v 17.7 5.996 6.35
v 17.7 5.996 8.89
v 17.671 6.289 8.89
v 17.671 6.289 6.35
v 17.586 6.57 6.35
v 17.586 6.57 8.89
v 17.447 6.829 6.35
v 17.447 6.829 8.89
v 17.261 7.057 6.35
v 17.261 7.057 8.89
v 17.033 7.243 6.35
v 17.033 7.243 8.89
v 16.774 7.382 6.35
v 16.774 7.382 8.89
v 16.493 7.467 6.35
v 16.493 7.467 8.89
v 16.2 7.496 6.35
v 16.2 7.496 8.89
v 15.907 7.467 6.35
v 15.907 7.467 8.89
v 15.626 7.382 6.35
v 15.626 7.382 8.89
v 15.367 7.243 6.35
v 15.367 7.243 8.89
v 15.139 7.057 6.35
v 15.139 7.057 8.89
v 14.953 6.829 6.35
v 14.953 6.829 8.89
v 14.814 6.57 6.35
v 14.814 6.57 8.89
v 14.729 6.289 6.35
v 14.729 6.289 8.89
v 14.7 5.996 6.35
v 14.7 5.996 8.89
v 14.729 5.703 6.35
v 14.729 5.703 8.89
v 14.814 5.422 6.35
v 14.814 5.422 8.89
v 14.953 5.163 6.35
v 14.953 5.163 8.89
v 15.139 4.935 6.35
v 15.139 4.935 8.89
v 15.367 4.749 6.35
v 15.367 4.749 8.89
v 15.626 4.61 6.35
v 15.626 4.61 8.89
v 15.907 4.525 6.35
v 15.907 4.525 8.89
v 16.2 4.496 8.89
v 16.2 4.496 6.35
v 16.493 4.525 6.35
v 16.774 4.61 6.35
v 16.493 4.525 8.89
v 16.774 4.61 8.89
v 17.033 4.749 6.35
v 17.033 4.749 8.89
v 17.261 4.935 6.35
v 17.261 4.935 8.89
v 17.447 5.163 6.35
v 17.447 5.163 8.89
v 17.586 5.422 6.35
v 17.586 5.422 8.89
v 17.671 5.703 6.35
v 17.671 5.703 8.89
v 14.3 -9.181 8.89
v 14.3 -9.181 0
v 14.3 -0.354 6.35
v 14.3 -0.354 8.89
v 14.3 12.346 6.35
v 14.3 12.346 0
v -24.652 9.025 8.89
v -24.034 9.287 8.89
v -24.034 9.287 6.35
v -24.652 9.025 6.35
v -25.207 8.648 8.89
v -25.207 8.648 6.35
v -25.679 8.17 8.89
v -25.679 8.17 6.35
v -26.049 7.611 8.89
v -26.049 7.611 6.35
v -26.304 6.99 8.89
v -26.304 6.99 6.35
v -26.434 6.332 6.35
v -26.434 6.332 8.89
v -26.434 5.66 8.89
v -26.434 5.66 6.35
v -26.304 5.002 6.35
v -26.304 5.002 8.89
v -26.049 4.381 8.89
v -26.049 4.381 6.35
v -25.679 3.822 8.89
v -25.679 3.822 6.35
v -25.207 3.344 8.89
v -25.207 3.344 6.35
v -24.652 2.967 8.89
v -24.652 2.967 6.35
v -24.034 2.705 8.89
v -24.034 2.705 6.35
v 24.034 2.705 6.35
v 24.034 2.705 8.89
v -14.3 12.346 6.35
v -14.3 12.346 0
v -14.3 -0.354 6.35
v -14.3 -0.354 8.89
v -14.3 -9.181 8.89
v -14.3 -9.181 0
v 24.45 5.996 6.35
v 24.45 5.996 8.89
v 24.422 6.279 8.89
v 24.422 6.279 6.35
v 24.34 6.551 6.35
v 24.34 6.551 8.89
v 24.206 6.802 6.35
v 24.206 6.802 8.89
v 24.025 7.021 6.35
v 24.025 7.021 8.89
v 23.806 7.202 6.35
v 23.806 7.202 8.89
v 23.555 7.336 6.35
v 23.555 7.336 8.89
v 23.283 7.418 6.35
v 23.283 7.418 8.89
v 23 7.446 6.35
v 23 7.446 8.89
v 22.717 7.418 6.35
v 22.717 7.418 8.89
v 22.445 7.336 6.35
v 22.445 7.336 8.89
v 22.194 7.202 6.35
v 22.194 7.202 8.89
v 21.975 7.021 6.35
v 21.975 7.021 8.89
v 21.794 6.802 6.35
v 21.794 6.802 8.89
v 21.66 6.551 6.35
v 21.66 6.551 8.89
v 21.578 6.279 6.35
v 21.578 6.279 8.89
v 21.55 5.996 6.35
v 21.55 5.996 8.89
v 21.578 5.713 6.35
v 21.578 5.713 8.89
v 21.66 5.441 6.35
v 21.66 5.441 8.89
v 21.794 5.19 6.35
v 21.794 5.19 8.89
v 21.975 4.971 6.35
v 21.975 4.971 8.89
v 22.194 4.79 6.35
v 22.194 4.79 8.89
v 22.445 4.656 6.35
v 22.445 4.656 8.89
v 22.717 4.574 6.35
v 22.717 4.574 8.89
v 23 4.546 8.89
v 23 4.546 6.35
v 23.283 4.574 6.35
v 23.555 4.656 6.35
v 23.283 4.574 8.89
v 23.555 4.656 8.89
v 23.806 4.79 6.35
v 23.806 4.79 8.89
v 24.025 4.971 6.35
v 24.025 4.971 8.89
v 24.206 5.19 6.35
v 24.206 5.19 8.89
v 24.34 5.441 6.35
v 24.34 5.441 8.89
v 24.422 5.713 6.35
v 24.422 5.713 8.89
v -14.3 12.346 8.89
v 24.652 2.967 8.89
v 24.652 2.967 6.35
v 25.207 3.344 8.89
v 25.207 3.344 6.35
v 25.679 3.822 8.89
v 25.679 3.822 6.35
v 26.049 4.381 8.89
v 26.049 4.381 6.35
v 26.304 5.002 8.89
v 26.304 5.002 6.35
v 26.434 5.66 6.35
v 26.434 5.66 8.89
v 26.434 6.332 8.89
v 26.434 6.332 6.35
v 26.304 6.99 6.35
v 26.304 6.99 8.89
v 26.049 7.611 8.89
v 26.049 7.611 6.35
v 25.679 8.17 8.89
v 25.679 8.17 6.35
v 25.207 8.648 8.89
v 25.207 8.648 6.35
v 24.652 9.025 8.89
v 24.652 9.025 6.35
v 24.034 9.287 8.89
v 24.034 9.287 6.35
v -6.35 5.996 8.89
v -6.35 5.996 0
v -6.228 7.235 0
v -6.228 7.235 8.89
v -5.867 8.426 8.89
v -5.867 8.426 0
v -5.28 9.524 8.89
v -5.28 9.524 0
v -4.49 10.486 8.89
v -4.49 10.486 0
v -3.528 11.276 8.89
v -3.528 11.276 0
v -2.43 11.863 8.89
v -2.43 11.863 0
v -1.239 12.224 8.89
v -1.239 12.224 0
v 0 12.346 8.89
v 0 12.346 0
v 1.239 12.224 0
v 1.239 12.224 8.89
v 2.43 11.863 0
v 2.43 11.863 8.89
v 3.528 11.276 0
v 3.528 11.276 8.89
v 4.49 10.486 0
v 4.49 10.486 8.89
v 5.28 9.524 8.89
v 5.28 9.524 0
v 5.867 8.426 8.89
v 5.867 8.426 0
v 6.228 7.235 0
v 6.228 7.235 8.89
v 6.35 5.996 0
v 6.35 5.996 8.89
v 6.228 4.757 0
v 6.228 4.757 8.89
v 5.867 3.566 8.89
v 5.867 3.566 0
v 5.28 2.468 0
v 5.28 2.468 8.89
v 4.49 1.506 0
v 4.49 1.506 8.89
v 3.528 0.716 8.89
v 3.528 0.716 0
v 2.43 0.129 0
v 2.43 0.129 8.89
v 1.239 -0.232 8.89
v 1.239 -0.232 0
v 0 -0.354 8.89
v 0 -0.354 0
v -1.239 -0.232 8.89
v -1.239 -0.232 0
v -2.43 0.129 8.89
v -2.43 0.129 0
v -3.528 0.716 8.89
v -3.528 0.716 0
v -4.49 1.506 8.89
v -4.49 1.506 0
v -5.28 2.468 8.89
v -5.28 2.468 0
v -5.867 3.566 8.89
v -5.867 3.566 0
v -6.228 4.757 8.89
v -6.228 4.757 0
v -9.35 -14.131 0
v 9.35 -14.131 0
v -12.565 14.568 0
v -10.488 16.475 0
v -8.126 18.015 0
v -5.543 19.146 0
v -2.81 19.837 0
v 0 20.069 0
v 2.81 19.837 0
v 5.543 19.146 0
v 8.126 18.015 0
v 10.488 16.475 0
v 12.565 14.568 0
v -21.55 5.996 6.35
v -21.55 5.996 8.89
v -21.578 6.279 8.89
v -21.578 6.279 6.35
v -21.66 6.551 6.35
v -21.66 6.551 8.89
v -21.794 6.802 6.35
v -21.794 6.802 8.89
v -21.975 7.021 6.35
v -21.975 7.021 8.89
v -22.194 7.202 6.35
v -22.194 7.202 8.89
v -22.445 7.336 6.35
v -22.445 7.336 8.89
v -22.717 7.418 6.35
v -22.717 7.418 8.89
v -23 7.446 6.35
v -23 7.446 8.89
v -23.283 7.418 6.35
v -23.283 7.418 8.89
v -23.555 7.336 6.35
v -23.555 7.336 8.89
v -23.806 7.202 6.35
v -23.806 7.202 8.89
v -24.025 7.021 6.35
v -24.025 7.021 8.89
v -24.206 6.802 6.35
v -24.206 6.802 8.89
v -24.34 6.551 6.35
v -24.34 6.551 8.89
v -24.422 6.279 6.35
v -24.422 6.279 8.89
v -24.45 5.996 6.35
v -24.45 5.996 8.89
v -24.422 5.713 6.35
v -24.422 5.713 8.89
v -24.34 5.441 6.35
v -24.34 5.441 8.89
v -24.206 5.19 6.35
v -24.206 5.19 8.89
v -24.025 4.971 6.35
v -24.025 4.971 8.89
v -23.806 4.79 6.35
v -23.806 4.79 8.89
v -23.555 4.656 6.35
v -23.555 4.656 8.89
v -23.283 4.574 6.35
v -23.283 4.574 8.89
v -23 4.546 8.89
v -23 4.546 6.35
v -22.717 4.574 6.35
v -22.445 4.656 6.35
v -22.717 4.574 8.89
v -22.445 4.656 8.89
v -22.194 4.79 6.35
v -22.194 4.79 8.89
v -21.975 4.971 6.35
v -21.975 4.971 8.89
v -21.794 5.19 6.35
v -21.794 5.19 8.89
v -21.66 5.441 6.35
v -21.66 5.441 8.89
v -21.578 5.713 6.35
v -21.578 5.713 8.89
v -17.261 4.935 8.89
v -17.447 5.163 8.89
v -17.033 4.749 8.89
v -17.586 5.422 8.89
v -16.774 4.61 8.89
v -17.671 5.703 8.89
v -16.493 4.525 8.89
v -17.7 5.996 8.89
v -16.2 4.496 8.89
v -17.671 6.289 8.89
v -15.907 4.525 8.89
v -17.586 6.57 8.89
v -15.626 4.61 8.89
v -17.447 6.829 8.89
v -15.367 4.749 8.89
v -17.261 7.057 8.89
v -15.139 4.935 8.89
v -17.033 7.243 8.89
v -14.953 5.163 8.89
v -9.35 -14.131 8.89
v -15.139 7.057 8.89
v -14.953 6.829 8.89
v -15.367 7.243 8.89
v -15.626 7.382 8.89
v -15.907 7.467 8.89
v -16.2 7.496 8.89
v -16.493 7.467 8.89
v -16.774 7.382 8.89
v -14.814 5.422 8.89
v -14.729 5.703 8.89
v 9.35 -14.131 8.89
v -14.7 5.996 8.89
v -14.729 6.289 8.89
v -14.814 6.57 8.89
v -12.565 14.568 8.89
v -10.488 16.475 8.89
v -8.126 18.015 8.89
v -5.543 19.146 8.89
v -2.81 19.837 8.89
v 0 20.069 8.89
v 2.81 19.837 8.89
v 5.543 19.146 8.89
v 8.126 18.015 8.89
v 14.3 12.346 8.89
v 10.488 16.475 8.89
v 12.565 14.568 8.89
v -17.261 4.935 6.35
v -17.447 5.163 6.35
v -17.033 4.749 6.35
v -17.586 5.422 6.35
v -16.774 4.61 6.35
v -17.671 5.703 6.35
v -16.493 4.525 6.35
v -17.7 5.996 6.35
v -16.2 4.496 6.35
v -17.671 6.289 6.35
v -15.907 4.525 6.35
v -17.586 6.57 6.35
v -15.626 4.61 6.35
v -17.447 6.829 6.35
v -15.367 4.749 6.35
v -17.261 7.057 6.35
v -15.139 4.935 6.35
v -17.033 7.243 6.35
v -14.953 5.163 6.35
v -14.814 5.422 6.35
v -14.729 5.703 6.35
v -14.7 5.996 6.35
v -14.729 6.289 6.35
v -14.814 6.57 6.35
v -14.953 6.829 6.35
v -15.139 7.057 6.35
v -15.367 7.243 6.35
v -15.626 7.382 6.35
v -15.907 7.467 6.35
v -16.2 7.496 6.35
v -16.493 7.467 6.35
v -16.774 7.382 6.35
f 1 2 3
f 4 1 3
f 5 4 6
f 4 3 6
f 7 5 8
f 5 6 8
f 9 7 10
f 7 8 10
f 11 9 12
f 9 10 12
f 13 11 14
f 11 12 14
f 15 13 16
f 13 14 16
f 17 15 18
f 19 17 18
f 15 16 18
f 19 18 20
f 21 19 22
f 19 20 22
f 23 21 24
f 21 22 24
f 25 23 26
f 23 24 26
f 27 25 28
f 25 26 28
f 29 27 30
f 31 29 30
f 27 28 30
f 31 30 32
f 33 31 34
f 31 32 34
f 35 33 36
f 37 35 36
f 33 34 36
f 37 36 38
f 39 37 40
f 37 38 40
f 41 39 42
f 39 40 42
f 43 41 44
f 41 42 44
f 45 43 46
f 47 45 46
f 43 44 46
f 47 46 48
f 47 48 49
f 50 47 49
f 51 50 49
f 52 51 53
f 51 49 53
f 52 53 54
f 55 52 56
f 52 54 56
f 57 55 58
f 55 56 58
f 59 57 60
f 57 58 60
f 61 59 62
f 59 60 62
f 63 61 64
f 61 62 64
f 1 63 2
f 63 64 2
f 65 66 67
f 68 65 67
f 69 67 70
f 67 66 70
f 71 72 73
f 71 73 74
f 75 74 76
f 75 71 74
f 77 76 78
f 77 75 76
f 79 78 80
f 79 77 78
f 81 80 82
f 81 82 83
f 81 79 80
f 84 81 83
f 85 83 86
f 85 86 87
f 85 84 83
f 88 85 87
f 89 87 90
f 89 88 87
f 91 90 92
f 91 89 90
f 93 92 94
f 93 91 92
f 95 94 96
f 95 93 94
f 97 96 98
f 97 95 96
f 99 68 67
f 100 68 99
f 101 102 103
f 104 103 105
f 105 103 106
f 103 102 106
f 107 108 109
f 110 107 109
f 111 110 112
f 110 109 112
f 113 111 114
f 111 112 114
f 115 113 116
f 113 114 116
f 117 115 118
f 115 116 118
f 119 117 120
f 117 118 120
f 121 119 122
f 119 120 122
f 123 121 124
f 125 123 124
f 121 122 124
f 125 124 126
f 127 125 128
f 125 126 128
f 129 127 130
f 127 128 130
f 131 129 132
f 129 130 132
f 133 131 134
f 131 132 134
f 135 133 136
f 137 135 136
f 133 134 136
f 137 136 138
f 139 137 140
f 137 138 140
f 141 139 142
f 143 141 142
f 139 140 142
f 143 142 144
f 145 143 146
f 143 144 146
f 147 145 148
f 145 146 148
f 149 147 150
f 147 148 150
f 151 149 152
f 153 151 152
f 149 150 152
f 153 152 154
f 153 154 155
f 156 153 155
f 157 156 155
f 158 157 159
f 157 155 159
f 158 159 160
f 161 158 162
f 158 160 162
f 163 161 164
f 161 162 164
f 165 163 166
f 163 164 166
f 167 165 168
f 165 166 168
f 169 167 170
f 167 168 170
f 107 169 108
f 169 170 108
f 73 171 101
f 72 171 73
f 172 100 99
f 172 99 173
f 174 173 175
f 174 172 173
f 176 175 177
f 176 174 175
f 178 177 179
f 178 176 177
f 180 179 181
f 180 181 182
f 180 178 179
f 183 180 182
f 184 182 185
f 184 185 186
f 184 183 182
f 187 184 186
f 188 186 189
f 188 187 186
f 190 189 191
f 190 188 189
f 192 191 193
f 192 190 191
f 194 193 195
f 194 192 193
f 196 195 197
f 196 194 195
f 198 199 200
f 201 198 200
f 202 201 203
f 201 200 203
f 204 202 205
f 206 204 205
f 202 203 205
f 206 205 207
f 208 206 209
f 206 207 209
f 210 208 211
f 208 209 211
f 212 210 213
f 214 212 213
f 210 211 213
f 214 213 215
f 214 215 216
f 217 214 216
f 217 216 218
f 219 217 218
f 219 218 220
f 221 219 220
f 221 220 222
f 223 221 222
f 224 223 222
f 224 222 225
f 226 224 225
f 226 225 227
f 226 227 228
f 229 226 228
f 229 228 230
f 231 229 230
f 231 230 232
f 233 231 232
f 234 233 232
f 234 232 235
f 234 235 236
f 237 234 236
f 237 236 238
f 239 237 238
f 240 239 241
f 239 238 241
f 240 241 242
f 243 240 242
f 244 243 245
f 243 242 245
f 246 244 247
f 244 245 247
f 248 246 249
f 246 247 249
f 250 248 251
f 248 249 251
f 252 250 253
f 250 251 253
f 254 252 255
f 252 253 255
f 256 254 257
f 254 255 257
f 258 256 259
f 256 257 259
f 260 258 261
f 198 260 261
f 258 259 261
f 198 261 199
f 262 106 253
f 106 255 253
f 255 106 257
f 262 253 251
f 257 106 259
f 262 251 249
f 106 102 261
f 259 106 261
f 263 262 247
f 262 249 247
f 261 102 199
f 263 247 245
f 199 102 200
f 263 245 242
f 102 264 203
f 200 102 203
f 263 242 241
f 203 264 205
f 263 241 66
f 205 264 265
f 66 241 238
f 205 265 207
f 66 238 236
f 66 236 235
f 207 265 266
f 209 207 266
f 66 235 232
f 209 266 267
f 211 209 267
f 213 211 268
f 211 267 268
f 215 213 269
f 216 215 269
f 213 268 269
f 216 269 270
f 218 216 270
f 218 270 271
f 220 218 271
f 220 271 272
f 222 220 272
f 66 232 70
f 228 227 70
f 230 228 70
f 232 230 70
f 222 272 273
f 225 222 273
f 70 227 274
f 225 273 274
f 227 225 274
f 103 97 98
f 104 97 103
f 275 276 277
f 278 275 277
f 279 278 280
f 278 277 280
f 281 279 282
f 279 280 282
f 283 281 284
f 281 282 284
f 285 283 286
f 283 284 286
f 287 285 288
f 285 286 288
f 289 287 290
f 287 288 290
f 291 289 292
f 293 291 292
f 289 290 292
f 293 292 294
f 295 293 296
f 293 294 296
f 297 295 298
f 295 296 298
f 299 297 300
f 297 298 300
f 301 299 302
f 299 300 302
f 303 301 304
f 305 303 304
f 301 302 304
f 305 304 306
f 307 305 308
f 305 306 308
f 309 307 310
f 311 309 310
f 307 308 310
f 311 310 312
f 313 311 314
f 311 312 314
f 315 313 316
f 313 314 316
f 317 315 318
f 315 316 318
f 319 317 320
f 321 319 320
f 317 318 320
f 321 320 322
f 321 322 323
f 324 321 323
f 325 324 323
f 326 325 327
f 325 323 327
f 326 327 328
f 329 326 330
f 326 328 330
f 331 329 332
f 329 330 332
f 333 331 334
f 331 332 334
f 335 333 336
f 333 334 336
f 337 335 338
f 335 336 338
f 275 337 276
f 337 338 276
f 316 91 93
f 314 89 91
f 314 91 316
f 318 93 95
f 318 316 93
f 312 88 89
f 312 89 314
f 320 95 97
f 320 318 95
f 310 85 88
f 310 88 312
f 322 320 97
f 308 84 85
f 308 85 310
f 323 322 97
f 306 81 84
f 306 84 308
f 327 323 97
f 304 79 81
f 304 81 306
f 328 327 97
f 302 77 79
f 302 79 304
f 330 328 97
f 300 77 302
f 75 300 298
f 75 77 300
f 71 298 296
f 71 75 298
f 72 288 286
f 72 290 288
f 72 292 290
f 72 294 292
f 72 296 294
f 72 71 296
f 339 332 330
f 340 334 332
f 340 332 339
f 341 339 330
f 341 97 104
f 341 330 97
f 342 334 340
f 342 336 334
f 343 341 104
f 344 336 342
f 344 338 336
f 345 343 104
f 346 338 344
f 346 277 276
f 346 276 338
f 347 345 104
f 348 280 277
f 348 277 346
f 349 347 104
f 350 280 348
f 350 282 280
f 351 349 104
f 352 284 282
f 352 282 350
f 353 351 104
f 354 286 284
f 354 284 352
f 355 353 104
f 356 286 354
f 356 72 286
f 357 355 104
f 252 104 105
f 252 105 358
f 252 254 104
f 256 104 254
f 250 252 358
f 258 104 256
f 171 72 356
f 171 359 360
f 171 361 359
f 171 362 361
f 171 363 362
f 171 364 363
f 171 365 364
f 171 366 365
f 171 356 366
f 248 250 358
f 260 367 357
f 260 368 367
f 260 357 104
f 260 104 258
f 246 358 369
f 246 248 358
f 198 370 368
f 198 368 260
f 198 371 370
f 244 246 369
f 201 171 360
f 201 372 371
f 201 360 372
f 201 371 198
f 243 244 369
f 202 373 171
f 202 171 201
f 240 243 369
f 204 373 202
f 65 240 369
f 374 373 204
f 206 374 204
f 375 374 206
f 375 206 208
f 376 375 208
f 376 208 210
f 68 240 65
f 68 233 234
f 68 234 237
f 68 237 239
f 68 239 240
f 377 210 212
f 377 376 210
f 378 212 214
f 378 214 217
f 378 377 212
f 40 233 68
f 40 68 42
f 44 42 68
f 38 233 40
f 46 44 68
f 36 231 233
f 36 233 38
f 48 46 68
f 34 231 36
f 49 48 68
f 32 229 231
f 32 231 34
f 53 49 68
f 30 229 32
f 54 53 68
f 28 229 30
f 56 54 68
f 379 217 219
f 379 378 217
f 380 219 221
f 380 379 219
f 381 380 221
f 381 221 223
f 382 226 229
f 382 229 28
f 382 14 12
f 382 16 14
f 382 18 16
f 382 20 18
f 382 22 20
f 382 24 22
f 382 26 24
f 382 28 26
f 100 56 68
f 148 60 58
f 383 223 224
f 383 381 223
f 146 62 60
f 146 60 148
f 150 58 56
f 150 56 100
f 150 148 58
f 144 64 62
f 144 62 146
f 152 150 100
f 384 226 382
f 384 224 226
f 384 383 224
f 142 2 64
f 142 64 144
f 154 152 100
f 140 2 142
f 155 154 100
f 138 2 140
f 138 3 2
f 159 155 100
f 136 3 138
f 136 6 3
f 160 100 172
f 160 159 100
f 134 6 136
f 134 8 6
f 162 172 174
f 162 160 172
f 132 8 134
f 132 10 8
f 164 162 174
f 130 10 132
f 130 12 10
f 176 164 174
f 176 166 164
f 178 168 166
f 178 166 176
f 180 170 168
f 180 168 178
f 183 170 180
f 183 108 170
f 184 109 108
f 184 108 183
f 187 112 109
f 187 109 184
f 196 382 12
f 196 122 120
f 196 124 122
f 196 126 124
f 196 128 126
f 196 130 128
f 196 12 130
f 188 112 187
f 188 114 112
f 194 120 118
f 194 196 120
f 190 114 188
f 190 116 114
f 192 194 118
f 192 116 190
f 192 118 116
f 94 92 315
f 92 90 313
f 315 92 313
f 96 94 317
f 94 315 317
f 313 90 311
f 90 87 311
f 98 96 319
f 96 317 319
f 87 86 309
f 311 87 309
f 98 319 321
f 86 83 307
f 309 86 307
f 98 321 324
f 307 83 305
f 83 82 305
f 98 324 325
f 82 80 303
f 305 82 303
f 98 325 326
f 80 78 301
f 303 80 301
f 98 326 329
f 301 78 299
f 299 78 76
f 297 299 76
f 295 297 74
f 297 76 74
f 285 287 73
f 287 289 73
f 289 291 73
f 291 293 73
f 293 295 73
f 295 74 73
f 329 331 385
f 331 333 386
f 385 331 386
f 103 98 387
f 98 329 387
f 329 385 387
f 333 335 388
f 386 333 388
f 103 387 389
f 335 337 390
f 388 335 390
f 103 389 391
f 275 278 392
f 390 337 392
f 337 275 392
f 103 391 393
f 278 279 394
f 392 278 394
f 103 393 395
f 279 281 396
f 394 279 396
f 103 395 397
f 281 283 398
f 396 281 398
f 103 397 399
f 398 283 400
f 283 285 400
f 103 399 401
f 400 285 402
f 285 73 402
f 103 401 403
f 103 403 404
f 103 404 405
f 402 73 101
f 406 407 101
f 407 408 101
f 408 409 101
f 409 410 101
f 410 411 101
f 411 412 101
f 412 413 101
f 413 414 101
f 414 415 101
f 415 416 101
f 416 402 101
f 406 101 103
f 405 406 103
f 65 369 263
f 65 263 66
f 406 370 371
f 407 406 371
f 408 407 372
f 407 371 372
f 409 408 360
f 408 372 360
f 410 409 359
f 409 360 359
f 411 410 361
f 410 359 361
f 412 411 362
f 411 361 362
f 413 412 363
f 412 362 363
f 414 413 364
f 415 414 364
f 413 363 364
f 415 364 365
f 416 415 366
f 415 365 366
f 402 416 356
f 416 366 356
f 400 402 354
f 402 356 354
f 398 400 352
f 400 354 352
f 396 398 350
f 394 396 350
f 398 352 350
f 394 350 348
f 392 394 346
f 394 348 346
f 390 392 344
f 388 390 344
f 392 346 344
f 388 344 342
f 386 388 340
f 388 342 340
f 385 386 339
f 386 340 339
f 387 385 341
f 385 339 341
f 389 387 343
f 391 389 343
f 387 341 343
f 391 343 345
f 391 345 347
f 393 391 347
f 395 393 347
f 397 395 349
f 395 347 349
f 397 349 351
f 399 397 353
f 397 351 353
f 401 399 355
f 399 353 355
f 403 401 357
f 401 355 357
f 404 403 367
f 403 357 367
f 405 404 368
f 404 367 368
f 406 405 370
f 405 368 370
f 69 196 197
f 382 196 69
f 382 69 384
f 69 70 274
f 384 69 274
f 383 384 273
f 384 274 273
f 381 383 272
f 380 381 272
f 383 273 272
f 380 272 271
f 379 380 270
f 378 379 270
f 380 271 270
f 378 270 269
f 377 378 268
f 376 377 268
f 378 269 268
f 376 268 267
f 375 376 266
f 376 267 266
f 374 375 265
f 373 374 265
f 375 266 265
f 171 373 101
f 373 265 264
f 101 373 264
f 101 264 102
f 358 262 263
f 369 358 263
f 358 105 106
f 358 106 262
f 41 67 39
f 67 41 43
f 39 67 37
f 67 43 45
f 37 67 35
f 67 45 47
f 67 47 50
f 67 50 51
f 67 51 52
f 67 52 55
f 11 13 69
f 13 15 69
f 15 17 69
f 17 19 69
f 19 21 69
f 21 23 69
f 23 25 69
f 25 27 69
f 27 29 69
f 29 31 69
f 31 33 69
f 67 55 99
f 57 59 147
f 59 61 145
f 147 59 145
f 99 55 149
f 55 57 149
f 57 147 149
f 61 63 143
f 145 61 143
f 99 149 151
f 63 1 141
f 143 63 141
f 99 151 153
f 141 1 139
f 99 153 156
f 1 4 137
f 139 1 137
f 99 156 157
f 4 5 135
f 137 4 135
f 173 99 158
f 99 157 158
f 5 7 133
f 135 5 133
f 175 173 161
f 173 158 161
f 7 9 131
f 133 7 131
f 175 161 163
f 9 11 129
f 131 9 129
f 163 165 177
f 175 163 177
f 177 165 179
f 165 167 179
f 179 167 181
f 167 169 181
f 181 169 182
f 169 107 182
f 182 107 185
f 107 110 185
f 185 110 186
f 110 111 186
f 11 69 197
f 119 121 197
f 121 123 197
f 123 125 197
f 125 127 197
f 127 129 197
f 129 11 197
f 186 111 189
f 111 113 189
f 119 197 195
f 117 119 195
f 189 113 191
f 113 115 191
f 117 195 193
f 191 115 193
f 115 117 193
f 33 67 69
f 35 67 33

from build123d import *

# Parameters (mm, degrees)
BOSS_EXTRUDE1_DEPTH = 8.89
SKETCH2_R           = 6.35
CUT_EXTRUDE1_DEPTH  = 27.197420728
SKETCH3_R           = 1.5
SKETCH3_R_2         = 1.45
BOSS_EXTRUDE2_DEPTH = 2.54


with BuildPart() as part:
    # Sketch1 → Boss-Extrude1 (new body)
    with BuildSketch(Plane.XY):
        with BuildLine():
            Line((-9.350252532, -14.130551756), (9.350252532, -14.130551756))
            Line((9.350252532, -14.130551756), (14.3, -9.180804288))
            Line((14.3, -9.180804288), (14.3, 12.34601478))
            ThreePointArc((14.3, 12.34601478), (0, 20.069448244), (-14.3, 12.34601478))
            Line((-14.3, 12.34601478), (-14.3, -9.180804288))
            Line((-14.3, -9.180804288), (-9.350252532, -14.130551756))
        make_face()
    extrude(amount=BOSS_EXTRUDE1_DEPTH)

    # Sketch2 → Cut-Extrude1 (cut, through all)
    with BuildSketch(Plane(origin=(0, 0, 0), x_dir=(-1, 0, 0), z_dir=(0, 0, -1))):
        with Locations((0, 5.99601478)):
            Circle(SKETCH2_R)
    extrude(amount=-CUT_EXTRUDE1_DEPTH, mode=Mode.SUBTRACT)

    # Sketch3 → Boss-Extrude2 (add)
    # profile 1 of 2: a face of its own
    with BuildSketch(Plane.XY.offset(8.89)):
        with BuildLine():
            Line((-14.3, 12.34601478), (-24.034198127, 9.287357095))
            ThreePointArc((-24.034198127, 9.287357095), (-26.45, 5.99601478), (-24.034198127, 2.704672465))
            Line((-24.034198127, 2.704672465), (-14.3, -0.35398522))
            Line((-14.3, -0.35398522), (-14.3, 12.34601478))
        make_face()
        with Locations((-16.2, 5.99601478)):
            Circle(SKETCH3_R, mode=Mode.SUBTRACT)
        with Locations((-23, 5.99601478)):
            Circle(SKETCH3_R_2, mode=Mode.SUBTRACT)
    # profile 2 of 2: a face of its own
    with BuildSketch(Plane.XY.offset(8.89)):
        with BuildLine():
            Line((14.3, 12.34601478), (14.3, -0.35398522))
            Line((14.3, -0.35398522), (24.034198127, 2.704672465))
            ThreePointArc((24.034198127, 2.704672465), (26.45, 5.99601478), (24.034198127, 9.287357095))
            Line((24.034198127, 9.287357095), (14.3, 12.34601478))
        make_face()
        with Locations((16.2, 5.99601478)):
            Circle(SKETCH3_R, mode=Mode.SUBTRACT)
        with Locations((23, 5.99601478)):
            Circle(SKETCH3_R_2, mode=Mode.SUBTRACT)
    extrude(amount=-BOSS_EXTRUDE2_DEPTH)


solid = part.part
